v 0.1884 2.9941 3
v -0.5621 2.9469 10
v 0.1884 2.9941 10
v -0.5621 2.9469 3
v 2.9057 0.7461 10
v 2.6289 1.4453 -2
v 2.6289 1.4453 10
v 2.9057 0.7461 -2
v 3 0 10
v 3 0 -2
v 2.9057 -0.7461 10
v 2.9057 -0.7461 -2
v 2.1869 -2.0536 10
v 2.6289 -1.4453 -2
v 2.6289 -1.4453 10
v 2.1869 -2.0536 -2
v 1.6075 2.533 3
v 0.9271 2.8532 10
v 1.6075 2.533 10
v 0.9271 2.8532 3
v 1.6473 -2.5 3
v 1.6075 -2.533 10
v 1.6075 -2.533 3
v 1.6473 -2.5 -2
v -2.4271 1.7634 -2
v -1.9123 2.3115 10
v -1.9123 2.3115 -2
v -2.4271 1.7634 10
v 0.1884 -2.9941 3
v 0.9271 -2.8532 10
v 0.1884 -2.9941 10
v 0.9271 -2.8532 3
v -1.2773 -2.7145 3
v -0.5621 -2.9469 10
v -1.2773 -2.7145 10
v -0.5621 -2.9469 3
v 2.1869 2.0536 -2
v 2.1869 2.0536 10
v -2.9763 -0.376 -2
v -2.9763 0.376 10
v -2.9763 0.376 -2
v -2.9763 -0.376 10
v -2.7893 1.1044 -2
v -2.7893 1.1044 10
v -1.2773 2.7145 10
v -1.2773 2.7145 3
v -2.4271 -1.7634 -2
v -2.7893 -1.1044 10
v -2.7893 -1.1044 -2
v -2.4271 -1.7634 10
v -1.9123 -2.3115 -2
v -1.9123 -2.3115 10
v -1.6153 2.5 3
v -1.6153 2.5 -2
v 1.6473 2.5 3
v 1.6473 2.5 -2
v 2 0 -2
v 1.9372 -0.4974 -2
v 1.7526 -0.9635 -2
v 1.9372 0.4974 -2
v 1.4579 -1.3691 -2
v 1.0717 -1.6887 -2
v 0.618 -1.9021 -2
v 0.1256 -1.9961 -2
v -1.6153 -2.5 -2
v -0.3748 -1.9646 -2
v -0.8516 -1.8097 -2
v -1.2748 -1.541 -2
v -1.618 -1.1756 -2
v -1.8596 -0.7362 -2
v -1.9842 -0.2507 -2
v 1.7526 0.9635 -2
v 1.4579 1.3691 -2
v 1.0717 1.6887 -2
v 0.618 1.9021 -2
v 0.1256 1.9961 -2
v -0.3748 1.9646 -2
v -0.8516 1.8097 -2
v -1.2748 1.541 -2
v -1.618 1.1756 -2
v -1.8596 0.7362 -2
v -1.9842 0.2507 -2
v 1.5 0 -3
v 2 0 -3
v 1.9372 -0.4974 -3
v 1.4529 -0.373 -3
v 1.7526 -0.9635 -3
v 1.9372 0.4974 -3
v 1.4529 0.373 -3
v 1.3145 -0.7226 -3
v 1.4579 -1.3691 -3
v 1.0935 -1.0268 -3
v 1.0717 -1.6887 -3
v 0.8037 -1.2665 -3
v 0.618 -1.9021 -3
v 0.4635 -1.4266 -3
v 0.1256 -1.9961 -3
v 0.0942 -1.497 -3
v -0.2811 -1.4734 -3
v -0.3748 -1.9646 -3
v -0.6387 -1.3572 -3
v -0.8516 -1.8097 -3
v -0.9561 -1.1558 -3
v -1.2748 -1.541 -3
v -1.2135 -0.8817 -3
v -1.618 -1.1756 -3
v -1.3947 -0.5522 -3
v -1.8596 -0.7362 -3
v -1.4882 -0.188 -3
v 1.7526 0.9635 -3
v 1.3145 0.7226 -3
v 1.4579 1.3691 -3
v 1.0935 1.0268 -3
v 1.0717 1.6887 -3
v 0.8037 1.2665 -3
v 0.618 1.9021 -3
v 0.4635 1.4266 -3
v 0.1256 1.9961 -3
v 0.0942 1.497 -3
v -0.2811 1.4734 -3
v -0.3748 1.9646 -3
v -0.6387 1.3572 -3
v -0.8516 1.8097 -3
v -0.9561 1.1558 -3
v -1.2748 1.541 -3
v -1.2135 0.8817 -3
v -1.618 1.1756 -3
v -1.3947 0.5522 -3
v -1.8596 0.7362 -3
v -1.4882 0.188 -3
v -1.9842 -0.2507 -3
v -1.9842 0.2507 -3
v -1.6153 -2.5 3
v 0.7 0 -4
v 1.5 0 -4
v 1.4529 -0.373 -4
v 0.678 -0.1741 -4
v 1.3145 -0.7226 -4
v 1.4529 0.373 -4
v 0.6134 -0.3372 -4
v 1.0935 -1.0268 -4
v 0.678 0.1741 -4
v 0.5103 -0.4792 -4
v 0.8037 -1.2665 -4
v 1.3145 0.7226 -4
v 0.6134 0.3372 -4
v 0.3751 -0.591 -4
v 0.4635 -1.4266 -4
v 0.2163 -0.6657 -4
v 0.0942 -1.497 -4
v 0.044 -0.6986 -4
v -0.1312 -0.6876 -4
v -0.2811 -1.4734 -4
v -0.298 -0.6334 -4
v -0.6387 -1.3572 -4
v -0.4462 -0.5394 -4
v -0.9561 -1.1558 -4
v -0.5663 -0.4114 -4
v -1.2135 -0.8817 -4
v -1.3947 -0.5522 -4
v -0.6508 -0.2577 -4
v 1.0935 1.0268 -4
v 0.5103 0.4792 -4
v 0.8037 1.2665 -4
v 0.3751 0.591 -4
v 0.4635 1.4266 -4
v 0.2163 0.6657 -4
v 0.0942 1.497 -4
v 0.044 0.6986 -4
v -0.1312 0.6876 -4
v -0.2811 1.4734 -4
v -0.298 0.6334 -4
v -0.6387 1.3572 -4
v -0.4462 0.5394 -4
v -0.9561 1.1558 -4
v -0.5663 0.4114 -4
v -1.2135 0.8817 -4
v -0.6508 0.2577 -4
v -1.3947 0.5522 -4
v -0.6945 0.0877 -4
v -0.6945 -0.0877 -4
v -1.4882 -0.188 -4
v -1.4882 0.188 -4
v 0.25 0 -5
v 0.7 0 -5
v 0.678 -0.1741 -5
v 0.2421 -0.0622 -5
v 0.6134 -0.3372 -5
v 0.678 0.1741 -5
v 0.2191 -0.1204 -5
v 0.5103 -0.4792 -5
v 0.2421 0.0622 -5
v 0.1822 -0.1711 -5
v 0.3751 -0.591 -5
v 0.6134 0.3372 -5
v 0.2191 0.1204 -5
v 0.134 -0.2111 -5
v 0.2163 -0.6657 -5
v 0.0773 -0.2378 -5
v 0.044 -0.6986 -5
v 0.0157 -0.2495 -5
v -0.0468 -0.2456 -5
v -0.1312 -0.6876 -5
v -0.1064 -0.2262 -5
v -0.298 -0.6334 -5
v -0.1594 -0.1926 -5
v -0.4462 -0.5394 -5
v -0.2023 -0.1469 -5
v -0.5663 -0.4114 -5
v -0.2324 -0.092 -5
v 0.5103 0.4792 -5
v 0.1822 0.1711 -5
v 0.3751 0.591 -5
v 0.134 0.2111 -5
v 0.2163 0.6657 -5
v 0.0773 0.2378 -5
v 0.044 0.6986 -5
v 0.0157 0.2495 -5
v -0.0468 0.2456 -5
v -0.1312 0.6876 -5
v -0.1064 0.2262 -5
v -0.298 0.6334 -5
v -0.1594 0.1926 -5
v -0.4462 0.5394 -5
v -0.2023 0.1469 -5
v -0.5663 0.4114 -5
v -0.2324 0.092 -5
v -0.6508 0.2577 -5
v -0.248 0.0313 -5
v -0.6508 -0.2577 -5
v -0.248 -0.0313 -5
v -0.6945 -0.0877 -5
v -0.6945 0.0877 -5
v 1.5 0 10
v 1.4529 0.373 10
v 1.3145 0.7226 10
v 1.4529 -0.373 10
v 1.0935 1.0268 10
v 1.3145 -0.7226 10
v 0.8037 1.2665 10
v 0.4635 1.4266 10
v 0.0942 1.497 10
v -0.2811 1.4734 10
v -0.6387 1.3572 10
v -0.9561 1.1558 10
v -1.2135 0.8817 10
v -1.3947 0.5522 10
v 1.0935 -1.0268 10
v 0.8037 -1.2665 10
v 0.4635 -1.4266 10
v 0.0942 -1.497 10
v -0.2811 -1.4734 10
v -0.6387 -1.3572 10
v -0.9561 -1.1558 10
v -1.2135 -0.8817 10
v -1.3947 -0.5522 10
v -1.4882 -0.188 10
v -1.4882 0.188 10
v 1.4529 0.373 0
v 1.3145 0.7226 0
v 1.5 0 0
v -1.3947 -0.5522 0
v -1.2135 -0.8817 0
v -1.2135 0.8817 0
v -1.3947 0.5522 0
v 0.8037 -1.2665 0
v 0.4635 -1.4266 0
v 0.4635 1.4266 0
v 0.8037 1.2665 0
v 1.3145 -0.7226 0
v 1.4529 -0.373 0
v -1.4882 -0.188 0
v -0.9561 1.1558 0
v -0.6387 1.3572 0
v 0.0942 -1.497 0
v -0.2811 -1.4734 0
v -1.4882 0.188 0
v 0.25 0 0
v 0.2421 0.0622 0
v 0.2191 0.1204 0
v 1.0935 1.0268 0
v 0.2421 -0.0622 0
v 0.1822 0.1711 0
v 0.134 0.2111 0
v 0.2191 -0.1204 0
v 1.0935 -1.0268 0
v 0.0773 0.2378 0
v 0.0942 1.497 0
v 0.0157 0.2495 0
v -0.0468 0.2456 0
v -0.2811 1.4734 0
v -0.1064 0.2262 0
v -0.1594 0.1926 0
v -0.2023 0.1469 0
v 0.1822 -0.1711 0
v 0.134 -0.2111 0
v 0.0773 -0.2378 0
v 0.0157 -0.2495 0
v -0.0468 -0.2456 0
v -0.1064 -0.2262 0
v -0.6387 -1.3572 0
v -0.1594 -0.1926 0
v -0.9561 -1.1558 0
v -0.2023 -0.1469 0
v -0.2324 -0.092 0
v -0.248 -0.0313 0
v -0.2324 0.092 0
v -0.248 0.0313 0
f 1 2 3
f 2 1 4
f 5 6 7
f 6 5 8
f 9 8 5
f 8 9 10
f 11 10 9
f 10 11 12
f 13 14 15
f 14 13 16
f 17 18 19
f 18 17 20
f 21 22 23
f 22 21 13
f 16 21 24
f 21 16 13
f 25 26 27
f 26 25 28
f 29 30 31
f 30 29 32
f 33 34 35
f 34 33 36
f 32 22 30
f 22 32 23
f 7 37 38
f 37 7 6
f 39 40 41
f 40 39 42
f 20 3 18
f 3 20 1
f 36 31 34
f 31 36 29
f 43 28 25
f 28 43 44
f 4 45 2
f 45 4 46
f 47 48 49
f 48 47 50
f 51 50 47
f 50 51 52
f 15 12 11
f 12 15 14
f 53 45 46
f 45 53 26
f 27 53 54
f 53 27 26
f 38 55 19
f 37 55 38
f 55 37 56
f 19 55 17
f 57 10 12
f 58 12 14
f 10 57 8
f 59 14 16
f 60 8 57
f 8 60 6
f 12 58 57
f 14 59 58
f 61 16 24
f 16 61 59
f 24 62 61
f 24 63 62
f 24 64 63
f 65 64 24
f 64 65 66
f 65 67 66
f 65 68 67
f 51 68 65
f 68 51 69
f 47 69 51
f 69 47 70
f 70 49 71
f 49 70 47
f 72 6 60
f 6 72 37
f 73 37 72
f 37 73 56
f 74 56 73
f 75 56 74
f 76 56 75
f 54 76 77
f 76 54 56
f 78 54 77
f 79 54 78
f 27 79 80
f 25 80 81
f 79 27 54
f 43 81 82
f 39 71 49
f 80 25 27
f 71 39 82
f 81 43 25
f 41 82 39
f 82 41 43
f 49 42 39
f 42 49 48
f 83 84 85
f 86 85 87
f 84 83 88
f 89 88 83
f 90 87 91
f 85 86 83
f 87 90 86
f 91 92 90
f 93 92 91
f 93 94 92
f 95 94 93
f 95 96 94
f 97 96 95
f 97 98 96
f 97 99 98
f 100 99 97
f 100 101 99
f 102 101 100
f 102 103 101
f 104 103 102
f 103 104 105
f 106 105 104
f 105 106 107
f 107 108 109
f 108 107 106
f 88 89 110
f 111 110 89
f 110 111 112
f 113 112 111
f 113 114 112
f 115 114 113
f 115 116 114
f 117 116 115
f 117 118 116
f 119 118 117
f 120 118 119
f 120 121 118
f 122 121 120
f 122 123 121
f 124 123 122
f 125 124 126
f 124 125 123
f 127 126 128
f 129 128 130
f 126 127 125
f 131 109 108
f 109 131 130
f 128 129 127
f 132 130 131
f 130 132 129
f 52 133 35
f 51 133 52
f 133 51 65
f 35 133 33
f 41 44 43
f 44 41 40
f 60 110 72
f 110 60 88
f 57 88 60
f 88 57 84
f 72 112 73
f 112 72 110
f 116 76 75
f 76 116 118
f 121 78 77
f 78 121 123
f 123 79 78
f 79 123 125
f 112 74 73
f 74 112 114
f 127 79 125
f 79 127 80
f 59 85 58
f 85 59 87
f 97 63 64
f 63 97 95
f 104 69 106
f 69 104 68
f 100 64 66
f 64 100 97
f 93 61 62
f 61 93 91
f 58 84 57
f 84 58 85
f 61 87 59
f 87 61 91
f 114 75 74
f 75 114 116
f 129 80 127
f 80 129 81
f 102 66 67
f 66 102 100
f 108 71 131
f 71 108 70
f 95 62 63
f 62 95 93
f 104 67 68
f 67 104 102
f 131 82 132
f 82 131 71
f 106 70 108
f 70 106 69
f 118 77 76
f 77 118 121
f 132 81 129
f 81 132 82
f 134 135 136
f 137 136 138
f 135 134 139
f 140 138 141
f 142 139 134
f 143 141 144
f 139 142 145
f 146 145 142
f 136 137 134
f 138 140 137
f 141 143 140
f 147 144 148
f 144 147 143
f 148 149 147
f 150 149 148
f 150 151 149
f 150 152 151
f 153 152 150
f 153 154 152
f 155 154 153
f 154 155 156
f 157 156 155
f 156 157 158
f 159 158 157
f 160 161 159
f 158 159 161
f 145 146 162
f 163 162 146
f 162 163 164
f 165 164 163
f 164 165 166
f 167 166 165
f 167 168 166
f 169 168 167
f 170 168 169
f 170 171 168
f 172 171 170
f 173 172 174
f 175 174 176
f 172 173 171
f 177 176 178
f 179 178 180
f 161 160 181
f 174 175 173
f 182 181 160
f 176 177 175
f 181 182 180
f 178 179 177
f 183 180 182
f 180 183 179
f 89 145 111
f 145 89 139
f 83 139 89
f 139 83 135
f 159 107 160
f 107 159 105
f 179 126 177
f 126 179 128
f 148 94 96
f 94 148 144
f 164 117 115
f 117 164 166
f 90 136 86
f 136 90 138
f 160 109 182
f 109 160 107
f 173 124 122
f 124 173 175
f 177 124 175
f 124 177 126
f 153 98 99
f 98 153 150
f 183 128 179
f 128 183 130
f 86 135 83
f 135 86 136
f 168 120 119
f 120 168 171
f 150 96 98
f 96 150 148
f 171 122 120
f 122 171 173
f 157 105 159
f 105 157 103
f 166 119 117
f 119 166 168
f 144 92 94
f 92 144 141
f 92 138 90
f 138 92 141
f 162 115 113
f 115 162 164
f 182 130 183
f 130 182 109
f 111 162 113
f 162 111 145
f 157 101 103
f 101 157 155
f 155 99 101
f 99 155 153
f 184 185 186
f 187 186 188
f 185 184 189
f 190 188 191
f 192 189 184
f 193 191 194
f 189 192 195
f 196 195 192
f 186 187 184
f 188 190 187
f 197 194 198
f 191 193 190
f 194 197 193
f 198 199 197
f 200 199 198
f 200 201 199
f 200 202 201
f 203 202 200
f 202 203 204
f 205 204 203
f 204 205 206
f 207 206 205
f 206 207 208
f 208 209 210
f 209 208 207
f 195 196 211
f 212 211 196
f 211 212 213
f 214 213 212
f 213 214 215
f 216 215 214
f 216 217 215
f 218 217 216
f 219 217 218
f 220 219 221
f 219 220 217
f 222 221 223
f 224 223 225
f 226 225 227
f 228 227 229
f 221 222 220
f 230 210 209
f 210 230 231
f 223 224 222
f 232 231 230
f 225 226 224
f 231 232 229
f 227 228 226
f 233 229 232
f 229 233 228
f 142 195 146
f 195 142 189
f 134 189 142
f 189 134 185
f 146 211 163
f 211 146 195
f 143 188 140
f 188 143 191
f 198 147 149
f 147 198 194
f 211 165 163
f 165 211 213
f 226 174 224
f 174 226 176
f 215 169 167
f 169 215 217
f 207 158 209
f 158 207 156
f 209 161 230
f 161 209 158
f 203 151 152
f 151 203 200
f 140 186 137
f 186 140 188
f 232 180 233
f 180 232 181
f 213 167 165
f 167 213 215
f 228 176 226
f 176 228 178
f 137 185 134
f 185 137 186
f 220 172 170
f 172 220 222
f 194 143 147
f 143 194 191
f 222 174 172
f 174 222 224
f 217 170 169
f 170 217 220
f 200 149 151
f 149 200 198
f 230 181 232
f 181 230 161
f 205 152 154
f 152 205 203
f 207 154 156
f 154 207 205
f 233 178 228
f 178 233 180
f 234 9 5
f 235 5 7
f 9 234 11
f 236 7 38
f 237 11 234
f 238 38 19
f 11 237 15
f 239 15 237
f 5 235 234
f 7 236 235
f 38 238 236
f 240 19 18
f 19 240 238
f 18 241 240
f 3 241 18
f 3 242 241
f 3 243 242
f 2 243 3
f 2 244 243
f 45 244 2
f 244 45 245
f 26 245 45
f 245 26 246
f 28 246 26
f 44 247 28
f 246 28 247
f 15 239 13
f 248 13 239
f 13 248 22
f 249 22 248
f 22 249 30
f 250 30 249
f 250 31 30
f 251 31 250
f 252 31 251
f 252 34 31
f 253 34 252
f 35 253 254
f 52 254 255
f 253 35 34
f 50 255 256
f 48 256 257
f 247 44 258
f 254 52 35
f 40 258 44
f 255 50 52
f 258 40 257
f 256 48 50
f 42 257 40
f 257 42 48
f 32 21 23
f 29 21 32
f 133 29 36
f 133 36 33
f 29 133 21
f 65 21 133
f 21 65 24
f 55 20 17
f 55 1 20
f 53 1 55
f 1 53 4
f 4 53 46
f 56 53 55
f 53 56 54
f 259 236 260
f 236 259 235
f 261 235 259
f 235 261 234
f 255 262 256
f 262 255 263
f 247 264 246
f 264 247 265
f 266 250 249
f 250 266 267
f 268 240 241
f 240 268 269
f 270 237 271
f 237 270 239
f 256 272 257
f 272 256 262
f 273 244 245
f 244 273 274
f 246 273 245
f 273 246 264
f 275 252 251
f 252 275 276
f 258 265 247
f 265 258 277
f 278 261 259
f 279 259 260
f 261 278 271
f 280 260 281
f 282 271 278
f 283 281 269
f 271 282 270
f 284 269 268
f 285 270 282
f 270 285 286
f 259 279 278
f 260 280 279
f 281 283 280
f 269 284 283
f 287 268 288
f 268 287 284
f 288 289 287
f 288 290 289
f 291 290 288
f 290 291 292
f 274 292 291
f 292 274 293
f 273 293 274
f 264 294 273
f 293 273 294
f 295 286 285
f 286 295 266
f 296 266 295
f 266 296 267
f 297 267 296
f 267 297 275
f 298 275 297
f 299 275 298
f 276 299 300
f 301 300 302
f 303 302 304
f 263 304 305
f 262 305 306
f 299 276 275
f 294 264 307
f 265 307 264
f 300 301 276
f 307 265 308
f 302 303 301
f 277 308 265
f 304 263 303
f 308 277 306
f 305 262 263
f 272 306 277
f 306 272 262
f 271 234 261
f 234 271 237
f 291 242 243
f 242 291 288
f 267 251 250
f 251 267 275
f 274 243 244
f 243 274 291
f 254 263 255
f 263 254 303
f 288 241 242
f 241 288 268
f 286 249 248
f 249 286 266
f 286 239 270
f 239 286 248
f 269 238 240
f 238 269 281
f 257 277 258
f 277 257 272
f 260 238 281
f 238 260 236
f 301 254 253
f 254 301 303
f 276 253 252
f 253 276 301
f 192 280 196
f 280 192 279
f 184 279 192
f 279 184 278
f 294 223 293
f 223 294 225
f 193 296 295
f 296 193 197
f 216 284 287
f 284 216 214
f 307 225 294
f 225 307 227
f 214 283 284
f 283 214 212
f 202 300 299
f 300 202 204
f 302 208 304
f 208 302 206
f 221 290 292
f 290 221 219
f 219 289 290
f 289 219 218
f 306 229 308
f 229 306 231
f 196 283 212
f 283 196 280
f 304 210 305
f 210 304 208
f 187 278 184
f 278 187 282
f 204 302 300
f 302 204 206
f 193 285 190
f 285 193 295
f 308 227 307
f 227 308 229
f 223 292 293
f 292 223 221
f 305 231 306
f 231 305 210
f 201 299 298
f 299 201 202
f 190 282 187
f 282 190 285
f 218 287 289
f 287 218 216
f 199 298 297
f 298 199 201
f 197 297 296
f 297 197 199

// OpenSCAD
$fn=25;
hotend_h = 15;
hotend_r = 3;

whole3mm_h = 10;
whole3mm_r = 1.5;

whole0_5mm_h = 5;
whole0_5mm_r = 0.25;

difference()
{
	translate([0,0,2.5])cylinder(r=hotend_r, h=hotend_h,center=true);
	rotate(180,0,0)translate([-2,2.5,-2]) cube([4,2,5]);
	translate([-2,2.5,-2]) cube([4,2,5]);

	translate([0,0,-3]) ring(hotend_r, hotend_r/1.5, 1);
	translate([0,0,-4]) ring(hotend_r, hotend_r/2, 1);
	translate([0,0,-5]) ring(hotend_r, 0.7, 1);
	
	// whole 3mm
	translate([0,0,whole3mm_h/2]) cylinder( r=whole3mm_r,  h=whole3mm_h, center=true);
	
	// whole 0.5mm
	translate([0,0,-whole0_5mm_h/2]) cylinder(r=whole0_5mm_r, h=whole0_5mm_h, center=true);
}

 


// modules
module ring(r1, r2, h) {
    difference() {
        cylinder(r = r1, h = h);
        translate([ 0, 0, -1 ]) cylinder(r = r2, h = h+2);
    }
}
